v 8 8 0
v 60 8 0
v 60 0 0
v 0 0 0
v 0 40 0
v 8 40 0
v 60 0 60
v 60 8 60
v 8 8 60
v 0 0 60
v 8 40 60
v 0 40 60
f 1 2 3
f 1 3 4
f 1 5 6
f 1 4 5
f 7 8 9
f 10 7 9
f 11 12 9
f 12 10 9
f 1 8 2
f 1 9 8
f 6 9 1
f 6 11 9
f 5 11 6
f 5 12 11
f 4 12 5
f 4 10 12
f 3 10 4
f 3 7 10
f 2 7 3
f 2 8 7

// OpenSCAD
$fn = 32;

// ----------------------------------------------------------------------
// Structural section: angle 60 x 40 mm
// ----------------------------------------------------------------------

// --- parameters (mm) ---
sec_w = 60;               // leg width, X
sec_h = 40;               // leg height, Y
flange_t = 8;             // leg thickness
plate_t = 60;             // cut length, Z (extrusion height)

profile = [[0, 0], [60, 0], [60, 8], [8, 8], [8, 40], [0, 40]];  // primary outline, 6 points, counter clockwise

// --- the one profile operation ---
linear_extrude(height = plate_t) polygon(points = profile);
